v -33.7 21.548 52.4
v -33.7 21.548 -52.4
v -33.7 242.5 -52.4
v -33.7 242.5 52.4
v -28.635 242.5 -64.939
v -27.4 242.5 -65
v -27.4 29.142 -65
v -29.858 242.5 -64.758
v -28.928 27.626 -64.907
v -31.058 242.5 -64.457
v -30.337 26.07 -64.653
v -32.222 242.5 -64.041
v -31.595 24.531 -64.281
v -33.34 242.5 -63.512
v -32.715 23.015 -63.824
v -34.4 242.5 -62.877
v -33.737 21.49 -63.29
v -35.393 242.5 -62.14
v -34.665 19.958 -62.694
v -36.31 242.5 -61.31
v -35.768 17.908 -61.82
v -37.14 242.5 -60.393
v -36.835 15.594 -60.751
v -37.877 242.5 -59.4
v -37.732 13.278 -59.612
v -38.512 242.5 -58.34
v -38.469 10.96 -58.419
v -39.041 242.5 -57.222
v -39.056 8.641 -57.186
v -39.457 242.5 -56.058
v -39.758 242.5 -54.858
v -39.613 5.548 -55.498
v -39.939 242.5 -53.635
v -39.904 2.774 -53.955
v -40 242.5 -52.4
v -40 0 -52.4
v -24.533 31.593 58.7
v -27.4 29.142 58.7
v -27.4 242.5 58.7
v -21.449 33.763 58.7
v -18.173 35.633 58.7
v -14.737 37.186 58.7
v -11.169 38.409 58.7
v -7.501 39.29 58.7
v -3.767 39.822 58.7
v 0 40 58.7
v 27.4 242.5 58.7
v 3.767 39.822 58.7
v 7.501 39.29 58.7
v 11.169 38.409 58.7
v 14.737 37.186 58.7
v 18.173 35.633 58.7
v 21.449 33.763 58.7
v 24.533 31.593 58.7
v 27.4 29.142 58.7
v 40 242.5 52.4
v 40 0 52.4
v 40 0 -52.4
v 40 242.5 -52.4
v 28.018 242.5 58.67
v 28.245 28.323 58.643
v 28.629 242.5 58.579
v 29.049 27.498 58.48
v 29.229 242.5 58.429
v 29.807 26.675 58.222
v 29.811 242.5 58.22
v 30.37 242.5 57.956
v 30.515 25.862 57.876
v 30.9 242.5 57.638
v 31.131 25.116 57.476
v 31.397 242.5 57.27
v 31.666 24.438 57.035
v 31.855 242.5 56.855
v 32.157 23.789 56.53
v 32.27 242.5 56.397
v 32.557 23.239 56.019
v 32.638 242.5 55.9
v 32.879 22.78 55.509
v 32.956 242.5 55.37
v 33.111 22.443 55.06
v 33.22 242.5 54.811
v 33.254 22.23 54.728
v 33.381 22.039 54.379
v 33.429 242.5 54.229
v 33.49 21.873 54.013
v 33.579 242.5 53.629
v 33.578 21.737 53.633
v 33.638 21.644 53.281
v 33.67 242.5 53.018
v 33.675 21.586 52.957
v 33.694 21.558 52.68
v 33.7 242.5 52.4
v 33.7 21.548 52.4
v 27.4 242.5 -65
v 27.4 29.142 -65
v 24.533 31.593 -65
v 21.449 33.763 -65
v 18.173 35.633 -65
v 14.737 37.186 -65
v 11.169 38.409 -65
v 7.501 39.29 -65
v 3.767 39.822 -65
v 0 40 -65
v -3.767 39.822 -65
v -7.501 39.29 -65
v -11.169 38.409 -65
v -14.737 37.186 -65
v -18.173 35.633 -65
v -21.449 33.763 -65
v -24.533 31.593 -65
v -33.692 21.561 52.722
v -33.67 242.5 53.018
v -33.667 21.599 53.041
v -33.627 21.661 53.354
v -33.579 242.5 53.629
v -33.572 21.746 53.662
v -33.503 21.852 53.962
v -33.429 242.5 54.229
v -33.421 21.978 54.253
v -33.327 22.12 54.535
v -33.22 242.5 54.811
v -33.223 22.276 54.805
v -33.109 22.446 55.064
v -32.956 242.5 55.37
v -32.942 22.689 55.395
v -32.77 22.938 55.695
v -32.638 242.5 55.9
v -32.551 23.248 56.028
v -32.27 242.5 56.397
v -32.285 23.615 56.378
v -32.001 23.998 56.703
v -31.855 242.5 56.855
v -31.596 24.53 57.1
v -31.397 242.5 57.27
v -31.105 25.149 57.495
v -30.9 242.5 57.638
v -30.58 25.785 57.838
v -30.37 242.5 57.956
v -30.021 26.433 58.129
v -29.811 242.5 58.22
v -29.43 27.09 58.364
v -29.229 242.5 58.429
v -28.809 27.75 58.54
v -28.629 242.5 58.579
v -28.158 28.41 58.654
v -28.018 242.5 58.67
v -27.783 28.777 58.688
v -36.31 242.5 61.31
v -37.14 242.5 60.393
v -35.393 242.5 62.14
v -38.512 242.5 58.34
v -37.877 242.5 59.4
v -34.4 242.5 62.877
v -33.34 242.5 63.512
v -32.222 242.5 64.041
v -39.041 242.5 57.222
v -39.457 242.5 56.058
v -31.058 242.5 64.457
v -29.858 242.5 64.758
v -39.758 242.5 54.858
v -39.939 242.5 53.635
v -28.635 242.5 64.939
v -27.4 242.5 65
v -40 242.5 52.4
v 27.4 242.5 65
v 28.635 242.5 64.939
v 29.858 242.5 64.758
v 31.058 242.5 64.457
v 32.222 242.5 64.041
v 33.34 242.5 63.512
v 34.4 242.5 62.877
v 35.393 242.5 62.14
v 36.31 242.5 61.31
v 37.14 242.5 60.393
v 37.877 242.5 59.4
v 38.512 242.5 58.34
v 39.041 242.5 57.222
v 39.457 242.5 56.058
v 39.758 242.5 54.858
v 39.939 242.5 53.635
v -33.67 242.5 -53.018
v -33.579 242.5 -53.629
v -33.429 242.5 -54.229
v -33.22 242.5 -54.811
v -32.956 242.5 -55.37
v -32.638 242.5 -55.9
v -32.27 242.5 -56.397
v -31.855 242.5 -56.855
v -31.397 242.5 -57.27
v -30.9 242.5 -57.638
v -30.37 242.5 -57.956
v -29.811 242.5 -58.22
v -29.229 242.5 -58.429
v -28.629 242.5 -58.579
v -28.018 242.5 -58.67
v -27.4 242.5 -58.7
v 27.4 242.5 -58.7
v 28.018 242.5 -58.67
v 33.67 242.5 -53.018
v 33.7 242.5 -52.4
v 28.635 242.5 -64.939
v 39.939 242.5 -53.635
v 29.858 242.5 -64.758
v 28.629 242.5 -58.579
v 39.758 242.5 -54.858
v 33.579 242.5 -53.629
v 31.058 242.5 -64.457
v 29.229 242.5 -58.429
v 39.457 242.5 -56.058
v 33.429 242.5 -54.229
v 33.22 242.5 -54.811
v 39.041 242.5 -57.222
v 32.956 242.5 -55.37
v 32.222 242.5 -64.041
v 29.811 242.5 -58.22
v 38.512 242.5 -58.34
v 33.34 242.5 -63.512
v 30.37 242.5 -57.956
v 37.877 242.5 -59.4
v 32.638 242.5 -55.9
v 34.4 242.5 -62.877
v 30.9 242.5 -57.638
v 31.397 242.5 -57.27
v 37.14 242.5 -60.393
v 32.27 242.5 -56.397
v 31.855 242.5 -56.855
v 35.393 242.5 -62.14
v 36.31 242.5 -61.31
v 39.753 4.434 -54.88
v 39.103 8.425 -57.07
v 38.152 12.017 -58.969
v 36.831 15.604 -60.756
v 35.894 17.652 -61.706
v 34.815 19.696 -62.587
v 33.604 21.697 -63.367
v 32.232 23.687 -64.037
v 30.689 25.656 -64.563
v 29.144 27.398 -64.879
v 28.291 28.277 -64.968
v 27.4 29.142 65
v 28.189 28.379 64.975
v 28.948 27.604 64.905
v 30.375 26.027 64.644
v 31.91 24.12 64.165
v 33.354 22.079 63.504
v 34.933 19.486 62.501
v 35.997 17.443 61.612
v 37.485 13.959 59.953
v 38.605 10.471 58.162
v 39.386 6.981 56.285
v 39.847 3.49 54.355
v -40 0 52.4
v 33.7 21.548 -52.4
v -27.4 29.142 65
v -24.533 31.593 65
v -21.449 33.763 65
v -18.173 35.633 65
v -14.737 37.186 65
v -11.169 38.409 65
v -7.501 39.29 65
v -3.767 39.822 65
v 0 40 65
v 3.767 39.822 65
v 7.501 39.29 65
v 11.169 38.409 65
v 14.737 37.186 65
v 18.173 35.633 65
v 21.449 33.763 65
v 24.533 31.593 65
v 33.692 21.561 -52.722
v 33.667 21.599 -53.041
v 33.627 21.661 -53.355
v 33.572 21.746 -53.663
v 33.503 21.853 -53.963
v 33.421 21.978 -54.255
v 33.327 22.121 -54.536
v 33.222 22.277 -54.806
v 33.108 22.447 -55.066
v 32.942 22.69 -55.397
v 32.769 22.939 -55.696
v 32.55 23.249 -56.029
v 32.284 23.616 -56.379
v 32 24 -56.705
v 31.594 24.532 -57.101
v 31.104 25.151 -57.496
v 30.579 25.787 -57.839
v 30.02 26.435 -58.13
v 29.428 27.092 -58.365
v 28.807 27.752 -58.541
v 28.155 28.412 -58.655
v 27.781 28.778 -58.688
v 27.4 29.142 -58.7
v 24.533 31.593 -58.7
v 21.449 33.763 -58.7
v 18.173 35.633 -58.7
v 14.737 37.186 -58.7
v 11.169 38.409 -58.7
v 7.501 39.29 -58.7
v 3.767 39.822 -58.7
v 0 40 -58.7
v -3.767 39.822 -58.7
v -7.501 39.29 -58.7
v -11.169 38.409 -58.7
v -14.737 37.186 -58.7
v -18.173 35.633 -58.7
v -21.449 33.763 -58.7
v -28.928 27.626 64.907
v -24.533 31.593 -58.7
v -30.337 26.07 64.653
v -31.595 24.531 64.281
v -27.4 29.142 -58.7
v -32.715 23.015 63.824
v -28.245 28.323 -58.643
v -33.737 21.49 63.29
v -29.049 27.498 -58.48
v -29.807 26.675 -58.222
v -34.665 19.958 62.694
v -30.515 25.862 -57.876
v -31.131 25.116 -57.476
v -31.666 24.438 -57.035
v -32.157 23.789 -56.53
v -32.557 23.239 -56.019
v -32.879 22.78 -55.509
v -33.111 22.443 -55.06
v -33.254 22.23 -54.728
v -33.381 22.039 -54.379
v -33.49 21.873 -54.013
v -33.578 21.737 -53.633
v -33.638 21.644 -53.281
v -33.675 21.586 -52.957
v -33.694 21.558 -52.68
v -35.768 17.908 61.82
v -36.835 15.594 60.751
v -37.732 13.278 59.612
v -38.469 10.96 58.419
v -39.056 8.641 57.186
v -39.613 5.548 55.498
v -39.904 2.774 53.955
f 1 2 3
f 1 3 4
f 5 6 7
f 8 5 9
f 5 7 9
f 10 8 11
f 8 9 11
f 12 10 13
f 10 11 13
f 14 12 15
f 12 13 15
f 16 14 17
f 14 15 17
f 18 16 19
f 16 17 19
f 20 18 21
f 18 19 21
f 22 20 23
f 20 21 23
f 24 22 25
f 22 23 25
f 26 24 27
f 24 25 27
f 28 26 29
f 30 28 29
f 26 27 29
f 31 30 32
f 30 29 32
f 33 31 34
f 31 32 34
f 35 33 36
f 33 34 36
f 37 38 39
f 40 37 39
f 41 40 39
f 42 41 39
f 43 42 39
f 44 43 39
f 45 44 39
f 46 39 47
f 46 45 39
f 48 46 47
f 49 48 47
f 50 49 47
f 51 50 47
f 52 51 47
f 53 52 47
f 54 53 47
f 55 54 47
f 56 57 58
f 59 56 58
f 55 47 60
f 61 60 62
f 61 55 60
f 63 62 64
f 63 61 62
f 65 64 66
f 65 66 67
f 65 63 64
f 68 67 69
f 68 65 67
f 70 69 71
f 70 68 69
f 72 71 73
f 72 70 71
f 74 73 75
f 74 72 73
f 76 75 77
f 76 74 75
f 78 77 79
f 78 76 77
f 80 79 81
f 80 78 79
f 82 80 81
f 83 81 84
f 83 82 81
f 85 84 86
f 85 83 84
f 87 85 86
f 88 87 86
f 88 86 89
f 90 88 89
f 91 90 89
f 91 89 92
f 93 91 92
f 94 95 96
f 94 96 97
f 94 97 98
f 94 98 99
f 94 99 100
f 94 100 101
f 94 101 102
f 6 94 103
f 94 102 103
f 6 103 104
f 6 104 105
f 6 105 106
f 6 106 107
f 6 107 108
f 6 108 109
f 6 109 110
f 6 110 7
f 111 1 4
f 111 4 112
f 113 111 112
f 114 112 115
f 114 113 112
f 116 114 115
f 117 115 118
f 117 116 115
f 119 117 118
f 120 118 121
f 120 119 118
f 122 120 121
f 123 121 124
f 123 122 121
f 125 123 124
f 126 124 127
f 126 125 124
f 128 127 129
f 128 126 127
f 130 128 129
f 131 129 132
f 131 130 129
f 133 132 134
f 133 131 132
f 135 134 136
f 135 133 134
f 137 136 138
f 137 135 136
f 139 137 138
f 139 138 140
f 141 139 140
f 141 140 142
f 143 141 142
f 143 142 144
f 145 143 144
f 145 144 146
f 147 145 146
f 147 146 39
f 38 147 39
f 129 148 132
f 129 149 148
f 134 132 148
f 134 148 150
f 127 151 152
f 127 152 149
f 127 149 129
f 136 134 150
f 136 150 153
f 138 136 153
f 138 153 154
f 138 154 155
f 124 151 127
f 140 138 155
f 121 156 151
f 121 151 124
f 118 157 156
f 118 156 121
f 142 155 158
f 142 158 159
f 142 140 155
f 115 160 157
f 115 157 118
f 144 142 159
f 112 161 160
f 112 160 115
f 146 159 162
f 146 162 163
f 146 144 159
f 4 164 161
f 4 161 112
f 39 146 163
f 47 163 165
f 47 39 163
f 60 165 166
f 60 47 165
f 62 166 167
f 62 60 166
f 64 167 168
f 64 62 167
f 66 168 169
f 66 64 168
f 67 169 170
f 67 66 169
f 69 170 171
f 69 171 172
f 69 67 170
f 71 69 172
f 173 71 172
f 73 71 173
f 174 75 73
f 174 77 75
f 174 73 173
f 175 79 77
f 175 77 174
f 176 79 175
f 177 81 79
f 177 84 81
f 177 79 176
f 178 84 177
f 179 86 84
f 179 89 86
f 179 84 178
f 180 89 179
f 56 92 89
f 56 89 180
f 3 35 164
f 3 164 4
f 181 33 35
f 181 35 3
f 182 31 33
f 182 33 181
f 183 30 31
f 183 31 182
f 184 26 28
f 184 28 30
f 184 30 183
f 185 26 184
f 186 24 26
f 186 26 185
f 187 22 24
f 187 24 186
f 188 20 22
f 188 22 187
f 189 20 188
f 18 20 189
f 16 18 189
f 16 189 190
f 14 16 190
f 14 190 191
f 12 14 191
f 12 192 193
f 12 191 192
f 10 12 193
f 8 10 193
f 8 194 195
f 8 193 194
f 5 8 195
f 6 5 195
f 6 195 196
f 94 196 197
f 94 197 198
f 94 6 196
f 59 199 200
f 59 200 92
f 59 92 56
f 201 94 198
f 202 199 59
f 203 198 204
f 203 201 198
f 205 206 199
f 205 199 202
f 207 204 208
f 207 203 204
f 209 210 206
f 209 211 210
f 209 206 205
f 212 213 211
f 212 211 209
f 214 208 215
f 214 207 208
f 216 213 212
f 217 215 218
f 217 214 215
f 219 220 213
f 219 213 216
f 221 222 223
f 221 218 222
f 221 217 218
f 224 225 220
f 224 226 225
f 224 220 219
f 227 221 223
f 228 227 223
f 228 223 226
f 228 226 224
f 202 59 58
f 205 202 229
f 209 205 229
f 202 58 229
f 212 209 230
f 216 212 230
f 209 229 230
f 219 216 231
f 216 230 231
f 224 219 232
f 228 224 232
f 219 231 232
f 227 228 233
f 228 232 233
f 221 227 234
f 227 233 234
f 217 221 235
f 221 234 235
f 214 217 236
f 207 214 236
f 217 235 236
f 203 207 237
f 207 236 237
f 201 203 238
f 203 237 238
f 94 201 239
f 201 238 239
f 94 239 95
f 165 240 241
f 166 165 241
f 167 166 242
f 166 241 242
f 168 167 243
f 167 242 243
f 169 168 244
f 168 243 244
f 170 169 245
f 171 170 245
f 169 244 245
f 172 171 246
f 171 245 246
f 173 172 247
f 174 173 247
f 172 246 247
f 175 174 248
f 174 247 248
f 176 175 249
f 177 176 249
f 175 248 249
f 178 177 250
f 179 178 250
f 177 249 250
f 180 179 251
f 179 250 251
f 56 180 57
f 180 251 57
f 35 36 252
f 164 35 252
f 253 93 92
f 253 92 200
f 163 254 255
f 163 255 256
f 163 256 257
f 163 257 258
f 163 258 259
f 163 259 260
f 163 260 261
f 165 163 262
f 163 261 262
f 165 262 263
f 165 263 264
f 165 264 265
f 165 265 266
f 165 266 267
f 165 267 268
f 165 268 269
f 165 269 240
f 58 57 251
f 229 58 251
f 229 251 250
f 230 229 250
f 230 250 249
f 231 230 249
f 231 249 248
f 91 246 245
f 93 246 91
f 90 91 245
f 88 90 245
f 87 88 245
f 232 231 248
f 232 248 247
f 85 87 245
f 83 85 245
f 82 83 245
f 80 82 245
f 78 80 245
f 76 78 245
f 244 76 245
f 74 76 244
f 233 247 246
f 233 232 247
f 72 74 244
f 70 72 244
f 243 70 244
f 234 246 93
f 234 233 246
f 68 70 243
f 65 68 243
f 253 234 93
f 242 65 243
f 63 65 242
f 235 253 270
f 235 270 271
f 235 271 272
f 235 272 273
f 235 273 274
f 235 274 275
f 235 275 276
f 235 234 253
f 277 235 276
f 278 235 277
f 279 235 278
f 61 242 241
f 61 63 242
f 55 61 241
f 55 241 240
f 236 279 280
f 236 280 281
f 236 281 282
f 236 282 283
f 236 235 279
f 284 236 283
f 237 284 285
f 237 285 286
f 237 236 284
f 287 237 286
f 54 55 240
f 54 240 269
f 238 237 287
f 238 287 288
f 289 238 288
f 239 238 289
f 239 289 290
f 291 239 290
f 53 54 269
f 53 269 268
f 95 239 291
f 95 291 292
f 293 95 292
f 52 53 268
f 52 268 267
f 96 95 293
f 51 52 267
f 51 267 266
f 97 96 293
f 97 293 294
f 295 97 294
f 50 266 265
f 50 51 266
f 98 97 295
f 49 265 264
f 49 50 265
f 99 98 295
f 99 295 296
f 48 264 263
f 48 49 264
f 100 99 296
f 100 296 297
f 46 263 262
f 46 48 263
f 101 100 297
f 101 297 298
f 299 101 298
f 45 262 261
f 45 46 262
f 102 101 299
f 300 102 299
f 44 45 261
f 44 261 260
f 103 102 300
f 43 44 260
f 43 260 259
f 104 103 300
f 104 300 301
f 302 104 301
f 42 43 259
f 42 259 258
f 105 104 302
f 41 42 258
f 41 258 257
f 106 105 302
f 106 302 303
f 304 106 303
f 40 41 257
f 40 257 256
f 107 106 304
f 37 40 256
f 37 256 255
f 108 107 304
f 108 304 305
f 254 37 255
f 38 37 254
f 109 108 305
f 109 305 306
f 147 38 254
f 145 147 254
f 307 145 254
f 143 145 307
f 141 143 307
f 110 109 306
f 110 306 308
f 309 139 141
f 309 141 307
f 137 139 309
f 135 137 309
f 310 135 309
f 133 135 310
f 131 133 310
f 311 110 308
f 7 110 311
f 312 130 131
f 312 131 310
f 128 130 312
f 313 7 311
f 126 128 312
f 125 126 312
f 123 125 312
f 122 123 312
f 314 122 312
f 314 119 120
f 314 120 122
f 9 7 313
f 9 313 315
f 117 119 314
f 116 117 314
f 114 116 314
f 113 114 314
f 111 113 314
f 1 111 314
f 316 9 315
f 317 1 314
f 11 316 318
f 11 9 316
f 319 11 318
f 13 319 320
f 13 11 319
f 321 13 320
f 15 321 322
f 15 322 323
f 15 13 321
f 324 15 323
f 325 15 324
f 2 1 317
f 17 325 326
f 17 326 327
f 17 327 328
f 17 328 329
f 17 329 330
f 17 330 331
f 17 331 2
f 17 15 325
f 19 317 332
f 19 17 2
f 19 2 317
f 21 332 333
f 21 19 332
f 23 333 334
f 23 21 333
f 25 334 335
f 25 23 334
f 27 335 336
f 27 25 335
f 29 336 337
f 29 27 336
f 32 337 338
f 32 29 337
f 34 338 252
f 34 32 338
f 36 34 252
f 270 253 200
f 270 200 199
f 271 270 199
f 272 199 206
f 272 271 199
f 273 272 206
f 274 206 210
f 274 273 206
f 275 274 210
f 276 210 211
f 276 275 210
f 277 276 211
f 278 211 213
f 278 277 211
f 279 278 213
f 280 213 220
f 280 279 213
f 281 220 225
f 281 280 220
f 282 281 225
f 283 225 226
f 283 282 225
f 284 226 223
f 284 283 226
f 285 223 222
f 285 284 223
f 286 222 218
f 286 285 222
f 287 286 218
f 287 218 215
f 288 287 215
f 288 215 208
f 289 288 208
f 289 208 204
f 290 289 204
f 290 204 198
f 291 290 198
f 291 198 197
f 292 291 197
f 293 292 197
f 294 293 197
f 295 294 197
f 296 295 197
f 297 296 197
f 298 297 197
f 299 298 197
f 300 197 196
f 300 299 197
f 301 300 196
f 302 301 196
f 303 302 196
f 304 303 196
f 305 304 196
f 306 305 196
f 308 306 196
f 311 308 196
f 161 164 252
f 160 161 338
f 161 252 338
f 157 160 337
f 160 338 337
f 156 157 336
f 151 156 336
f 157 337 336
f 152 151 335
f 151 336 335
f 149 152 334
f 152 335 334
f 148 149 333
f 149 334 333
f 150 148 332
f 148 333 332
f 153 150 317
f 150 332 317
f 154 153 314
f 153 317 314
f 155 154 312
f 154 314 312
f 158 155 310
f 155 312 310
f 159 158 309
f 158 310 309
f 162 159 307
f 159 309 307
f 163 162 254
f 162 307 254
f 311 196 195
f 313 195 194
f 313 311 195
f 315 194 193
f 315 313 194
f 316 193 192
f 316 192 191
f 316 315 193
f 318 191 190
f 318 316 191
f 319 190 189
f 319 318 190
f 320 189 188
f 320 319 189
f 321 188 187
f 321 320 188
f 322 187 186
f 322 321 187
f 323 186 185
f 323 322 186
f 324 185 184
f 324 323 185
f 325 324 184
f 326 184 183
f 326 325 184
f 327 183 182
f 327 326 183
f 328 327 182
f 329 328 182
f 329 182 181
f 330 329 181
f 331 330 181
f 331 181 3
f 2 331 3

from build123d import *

# Parameters (mm, degrees)
AUFSATZ_LINEAR_AUSTRAGEN1_DEPTH      = 242.5
SCHNITT_LINEAR_AUSTRAGEN1_DEPTH      = 255.22676885017438
SCHNITT_LINEAR_AUSTRAGEN1_DEPTH_BACK = 255.22676885017438
SKIZZE2_R                            = 40


with BuildPart() as part:
    # Skizze1 → Aufsatz-Linear austragen1 (new body)
    with BuildSketch(Plane(origin=(0, 0, 0), x_dir=(1, 0, 0), z_dir=(0, 1, 0))):
        with BuildLine():
            Line((-27.399999999999988, -65), (27.400000000000016, -65.00000000000001))
            ThreePointArc((27.400000000000016, -65.00000000000001), (36.30954544295052, -61.30954544295051), (40.00000000000002, -52.400000000000006))
            Line((40.00000000000002, -52.400000000000006), (40, 52.400000000000006))
            ThreePointArc((40, 52.400000000000006), (36.309545442950494, 61.30954544295051), (27.4, 65))
            Line((27.4, 65), (-27.399999999999995, 64.99999999999997))
            ThreePointArc((-27.399999999999995, 64.99999999999997), (-36.30954544295047, 61.30954544295047), (-39.99999999999999, 52.39999999999999))
            Line((-39.99999999999999, 52.39999999999999), (-39.999999999999986, -52.400000000000006))
            ThreePointArc((-39.999999999999986, -52.400000000000006), (-36.30954544295049, -61.3095454429505), (-27.399999999999988, -65))
        make_face()
        with BuildLine():
            Line((-27.39999999999999, -58.7), (27.400000000000016, -58.7))
            ThreePointArc((27.400000000000016, -58.7), (31.854772721475264, -56.85477272147525), (33.70000000000002, -52.400000000000006))
            Line((33.70000000000002, -52.400000000000006), (33.7, 52.400000000000006))
            ThreePointArc((33.7, 52.400000000000006), (31.854772721475253, 56.85477272147526), (27.400000000000002, 58.7))
            Line((27.400000000000002, 58.7), (-27.39999999999999, 58.7))
            ThreePointArc((-27.39999999999999, 58.7), (-31.854772721475243, 56.85477272147526), (-33.69999999999999, 52.400000000000006))
            Line((-33.69999999999999, 52.400000000000006), (-33.69999999999999, -52.400000000000006))
            ThreePointArc((-33.69999999999999, -52.400000000000006), (-31.85477272147524, -56.85477272147525), (-27.39999999999999, -58.7))
        make_face(mode=Mode.SUBTRACT)
    extrude(amount=AUFSATZ_LINEAR_AUSTRAGEN1_DEPTH)

    # Skizze2 → Schnitt-Linear austragen1 (cut, two sides: drawn at the far end of the back side and taken through both)
    with BuildSketch(Plane.XY.offset(-SCHNITT_LINEAR_AUSTRAGEN1_DEPTH_BACK)):
        Circle(SKIZZE2_R)
    extrude(amount=SCHNITT_LINEAR_AUSTRAGEN1_DEPTH + SCHNITT_LINEAR_AUSTRAGEN1_DEPTH_BACK, mode=Mode.SUBTRACT)


solid = part.part
